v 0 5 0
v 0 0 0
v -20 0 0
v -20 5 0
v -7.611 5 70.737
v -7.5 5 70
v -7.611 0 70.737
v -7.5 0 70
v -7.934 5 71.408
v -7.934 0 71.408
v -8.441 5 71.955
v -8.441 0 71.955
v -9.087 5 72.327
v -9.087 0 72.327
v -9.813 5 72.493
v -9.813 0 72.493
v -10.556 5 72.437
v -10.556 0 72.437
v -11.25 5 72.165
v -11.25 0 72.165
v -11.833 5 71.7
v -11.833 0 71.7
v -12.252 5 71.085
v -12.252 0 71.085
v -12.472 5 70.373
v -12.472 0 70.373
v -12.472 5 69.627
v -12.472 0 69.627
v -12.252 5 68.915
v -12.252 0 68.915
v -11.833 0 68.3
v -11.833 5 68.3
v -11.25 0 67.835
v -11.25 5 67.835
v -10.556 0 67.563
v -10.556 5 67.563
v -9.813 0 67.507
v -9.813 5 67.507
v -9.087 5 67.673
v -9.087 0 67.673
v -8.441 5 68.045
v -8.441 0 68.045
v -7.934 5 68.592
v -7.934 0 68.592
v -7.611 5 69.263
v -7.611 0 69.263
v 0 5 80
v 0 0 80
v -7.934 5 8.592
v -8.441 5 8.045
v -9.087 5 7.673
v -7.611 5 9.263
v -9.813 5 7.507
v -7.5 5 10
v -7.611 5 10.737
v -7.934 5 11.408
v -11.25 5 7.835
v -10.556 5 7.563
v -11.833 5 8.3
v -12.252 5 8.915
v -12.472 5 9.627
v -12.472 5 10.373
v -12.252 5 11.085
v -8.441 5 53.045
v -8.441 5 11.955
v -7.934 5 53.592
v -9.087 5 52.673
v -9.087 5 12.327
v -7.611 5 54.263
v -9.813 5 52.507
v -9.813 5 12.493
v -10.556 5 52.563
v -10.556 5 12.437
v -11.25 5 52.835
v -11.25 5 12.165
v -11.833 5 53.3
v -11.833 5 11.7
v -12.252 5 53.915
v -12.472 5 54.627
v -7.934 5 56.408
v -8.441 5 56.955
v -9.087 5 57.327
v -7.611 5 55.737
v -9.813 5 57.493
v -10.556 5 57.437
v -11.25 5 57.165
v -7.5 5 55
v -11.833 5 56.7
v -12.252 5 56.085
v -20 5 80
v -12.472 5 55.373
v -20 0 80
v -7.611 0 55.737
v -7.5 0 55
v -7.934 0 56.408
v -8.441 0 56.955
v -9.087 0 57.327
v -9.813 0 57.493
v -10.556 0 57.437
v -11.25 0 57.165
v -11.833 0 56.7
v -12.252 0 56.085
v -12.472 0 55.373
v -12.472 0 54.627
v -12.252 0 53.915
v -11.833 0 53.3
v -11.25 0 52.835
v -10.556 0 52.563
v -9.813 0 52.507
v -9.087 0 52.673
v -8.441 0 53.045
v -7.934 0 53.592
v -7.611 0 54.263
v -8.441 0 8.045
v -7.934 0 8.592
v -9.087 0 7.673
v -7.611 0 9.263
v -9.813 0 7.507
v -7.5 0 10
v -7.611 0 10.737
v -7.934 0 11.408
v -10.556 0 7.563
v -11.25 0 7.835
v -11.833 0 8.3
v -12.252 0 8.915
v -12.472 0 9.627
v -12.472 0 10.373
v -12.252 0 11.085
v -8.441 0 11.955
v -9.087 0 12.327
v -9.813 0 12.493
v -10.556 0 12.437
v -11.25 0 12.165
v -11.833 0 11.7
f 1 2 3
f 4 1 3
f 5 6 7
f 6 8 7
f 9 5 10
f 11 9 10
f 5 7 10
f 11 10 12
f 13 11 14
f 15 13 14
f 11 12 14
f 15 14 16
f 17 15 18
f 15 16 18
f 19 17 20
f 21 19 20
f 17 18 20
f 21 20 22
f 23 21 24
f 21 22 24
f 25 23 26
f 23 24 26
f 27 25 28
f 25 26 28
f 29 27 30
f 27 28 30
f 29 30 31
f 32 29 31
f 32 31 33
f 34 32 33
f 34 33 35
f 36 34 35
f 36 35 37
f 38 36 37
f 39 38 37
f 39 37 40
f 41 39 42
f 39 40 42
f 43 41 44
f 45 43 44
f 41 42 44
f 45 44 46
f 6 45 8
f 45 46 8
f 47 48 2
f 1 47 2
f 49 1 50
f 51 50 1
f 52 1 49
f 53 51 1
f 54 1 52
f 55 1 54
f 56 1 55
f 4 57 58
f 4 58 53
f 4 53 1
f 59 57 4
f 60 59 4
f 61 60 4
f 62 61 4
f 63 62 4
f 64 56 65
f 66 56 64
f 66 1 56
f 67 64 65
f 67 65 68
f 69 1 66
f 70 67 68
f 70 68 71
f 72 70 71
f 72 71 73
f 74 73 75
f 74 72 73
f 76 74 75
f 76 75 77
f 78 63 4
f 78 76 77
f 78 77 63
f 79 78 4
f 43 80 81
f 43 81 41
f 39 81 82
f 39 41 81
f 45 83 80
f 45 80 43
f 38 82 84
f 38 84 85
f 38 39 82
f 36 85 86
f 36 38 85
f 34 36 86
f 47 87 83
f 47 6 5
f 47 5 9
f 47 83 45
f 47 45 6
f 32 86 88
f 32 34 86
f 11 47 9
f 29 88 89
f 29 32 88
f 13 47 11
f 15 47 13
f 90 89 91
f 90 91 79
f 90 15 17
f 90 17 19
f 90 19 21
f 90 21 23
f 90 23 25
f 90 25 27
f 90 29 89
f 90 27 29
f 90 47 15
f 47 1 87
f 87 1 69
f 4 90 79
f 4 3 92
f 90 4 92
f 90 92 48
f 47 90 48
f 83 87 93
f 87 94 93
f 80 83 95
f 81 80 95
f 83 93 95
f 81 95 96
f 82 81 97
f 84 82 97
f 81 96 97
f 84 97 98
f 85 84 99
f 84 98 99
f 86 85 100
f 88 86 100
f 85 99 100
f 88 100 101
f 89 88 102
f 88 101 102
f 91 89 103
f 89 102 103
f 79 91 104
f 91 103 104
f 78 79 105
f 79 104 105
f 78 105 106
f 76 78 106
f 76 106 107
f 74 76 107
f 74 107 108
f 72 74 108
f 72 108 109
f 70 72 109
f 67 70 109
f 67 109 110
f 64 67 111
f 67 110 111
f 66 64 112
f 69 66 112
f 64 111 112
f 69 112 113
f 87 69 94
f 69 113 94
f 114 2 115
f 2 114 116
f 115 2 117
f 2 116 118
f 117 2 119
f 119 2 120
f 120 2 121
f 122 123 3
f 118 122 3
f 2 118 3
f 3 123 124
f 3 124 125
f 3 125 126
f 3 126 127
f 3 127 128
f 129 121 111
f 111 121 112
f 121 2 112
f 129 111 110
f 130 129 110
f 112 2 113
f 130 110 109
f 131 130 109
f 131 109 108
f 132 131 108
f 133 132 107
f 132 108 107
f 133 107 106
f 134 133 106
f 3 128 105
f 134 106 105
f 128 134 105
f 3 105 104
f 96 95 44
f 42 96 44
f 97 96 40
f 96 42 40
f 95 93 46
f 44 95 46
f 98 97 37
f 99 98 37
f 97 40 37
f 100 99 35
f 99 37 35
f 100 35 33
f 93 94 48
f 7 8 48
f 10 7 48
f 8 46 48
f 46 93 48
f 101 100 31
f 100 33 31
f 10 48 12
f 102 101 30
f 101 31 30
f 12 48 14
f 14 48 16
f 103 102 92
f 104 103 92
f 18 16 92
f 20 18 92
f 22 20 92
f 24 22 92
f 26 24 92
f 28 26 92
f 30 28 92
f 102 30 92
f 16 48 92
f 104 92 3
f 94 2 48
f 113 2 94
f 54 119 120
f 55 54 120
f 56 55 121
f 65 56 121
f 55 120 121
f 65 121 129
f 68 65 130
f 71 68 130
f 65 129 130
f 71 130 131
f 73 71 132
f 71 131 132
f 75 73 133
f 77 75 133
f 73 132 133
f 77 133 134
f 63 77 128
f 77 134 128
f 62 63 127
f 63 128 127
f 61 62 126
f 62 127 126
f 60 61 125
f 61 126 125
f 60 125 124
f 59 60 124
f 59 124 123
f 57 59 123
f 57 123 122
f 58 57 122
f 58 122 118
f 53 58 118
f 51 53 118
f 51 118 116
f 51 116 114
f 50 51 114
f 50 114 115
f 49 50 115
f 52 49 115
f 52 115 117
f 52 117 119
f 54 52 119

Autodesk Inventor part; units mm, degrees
ref_plane "YZ Plane" through (0, 0, 0) normal (1, 0, 0) x (0, 1, 0)
ref_plane "XZ Plane" through (0, 0, 0) normal (0, 1, 0) x (-1, 0, 0)
ref_plane "XY Plane" through (0, 0, 0) normal (0, 0, 1) x (1, 0, 0)
sketch "Sketch4" plane through (0, 0, 0) normal (0, 1, 0) x (-1, 0, 0)
  line L0 (0, 0) -> (20, 0)
  line L1 (20, 0) -> (20, 80)
  line L2 (20, 80) -> (0, 80)
  line L3 (0, 80) -> (0, 0)
  circle A0 centre (-8.1929, 3.0927) radius 2.5
  dimension "d0" = 80
  dimension "d3" = 20
extrude "Extrusion1" add sketch "Sketch4" along normal blind 5 contours L3 L2 L1 L0
sketch "Sketch5" plane through (0, 0, 0) normal (0, -1, 0) x (1, 0, 0)
  line L0 (0, 0) -> (-20, 0) projected
  line L1 (0, 80) -> (0, 0) projected
  line L2 (-20, 80) -> (0, 80) projected
  line L3 (-20, 0) -> (-20, 80) projected
  circle A0 centre (-10, 10) radius 2.5
  circle A1 centre (-10, 70) radius 2.5
  circle A2 centre (-10, 55) radius 2.5
  dimension "d5" = 5
  dimension "d6" = 5
  dimension "d7" = 10
  dimension "d8" = 10
  dimension "d9" = 10
  dimension "d10" = 10
  dimension "d13" = 5
  dimension "d17" = 15
extrude "Extrusion3" cut sketch "Sketch5" against normal through all contours A0 | A1 | A2
properties part number "holdersupport" material "Wood (Birch)"
